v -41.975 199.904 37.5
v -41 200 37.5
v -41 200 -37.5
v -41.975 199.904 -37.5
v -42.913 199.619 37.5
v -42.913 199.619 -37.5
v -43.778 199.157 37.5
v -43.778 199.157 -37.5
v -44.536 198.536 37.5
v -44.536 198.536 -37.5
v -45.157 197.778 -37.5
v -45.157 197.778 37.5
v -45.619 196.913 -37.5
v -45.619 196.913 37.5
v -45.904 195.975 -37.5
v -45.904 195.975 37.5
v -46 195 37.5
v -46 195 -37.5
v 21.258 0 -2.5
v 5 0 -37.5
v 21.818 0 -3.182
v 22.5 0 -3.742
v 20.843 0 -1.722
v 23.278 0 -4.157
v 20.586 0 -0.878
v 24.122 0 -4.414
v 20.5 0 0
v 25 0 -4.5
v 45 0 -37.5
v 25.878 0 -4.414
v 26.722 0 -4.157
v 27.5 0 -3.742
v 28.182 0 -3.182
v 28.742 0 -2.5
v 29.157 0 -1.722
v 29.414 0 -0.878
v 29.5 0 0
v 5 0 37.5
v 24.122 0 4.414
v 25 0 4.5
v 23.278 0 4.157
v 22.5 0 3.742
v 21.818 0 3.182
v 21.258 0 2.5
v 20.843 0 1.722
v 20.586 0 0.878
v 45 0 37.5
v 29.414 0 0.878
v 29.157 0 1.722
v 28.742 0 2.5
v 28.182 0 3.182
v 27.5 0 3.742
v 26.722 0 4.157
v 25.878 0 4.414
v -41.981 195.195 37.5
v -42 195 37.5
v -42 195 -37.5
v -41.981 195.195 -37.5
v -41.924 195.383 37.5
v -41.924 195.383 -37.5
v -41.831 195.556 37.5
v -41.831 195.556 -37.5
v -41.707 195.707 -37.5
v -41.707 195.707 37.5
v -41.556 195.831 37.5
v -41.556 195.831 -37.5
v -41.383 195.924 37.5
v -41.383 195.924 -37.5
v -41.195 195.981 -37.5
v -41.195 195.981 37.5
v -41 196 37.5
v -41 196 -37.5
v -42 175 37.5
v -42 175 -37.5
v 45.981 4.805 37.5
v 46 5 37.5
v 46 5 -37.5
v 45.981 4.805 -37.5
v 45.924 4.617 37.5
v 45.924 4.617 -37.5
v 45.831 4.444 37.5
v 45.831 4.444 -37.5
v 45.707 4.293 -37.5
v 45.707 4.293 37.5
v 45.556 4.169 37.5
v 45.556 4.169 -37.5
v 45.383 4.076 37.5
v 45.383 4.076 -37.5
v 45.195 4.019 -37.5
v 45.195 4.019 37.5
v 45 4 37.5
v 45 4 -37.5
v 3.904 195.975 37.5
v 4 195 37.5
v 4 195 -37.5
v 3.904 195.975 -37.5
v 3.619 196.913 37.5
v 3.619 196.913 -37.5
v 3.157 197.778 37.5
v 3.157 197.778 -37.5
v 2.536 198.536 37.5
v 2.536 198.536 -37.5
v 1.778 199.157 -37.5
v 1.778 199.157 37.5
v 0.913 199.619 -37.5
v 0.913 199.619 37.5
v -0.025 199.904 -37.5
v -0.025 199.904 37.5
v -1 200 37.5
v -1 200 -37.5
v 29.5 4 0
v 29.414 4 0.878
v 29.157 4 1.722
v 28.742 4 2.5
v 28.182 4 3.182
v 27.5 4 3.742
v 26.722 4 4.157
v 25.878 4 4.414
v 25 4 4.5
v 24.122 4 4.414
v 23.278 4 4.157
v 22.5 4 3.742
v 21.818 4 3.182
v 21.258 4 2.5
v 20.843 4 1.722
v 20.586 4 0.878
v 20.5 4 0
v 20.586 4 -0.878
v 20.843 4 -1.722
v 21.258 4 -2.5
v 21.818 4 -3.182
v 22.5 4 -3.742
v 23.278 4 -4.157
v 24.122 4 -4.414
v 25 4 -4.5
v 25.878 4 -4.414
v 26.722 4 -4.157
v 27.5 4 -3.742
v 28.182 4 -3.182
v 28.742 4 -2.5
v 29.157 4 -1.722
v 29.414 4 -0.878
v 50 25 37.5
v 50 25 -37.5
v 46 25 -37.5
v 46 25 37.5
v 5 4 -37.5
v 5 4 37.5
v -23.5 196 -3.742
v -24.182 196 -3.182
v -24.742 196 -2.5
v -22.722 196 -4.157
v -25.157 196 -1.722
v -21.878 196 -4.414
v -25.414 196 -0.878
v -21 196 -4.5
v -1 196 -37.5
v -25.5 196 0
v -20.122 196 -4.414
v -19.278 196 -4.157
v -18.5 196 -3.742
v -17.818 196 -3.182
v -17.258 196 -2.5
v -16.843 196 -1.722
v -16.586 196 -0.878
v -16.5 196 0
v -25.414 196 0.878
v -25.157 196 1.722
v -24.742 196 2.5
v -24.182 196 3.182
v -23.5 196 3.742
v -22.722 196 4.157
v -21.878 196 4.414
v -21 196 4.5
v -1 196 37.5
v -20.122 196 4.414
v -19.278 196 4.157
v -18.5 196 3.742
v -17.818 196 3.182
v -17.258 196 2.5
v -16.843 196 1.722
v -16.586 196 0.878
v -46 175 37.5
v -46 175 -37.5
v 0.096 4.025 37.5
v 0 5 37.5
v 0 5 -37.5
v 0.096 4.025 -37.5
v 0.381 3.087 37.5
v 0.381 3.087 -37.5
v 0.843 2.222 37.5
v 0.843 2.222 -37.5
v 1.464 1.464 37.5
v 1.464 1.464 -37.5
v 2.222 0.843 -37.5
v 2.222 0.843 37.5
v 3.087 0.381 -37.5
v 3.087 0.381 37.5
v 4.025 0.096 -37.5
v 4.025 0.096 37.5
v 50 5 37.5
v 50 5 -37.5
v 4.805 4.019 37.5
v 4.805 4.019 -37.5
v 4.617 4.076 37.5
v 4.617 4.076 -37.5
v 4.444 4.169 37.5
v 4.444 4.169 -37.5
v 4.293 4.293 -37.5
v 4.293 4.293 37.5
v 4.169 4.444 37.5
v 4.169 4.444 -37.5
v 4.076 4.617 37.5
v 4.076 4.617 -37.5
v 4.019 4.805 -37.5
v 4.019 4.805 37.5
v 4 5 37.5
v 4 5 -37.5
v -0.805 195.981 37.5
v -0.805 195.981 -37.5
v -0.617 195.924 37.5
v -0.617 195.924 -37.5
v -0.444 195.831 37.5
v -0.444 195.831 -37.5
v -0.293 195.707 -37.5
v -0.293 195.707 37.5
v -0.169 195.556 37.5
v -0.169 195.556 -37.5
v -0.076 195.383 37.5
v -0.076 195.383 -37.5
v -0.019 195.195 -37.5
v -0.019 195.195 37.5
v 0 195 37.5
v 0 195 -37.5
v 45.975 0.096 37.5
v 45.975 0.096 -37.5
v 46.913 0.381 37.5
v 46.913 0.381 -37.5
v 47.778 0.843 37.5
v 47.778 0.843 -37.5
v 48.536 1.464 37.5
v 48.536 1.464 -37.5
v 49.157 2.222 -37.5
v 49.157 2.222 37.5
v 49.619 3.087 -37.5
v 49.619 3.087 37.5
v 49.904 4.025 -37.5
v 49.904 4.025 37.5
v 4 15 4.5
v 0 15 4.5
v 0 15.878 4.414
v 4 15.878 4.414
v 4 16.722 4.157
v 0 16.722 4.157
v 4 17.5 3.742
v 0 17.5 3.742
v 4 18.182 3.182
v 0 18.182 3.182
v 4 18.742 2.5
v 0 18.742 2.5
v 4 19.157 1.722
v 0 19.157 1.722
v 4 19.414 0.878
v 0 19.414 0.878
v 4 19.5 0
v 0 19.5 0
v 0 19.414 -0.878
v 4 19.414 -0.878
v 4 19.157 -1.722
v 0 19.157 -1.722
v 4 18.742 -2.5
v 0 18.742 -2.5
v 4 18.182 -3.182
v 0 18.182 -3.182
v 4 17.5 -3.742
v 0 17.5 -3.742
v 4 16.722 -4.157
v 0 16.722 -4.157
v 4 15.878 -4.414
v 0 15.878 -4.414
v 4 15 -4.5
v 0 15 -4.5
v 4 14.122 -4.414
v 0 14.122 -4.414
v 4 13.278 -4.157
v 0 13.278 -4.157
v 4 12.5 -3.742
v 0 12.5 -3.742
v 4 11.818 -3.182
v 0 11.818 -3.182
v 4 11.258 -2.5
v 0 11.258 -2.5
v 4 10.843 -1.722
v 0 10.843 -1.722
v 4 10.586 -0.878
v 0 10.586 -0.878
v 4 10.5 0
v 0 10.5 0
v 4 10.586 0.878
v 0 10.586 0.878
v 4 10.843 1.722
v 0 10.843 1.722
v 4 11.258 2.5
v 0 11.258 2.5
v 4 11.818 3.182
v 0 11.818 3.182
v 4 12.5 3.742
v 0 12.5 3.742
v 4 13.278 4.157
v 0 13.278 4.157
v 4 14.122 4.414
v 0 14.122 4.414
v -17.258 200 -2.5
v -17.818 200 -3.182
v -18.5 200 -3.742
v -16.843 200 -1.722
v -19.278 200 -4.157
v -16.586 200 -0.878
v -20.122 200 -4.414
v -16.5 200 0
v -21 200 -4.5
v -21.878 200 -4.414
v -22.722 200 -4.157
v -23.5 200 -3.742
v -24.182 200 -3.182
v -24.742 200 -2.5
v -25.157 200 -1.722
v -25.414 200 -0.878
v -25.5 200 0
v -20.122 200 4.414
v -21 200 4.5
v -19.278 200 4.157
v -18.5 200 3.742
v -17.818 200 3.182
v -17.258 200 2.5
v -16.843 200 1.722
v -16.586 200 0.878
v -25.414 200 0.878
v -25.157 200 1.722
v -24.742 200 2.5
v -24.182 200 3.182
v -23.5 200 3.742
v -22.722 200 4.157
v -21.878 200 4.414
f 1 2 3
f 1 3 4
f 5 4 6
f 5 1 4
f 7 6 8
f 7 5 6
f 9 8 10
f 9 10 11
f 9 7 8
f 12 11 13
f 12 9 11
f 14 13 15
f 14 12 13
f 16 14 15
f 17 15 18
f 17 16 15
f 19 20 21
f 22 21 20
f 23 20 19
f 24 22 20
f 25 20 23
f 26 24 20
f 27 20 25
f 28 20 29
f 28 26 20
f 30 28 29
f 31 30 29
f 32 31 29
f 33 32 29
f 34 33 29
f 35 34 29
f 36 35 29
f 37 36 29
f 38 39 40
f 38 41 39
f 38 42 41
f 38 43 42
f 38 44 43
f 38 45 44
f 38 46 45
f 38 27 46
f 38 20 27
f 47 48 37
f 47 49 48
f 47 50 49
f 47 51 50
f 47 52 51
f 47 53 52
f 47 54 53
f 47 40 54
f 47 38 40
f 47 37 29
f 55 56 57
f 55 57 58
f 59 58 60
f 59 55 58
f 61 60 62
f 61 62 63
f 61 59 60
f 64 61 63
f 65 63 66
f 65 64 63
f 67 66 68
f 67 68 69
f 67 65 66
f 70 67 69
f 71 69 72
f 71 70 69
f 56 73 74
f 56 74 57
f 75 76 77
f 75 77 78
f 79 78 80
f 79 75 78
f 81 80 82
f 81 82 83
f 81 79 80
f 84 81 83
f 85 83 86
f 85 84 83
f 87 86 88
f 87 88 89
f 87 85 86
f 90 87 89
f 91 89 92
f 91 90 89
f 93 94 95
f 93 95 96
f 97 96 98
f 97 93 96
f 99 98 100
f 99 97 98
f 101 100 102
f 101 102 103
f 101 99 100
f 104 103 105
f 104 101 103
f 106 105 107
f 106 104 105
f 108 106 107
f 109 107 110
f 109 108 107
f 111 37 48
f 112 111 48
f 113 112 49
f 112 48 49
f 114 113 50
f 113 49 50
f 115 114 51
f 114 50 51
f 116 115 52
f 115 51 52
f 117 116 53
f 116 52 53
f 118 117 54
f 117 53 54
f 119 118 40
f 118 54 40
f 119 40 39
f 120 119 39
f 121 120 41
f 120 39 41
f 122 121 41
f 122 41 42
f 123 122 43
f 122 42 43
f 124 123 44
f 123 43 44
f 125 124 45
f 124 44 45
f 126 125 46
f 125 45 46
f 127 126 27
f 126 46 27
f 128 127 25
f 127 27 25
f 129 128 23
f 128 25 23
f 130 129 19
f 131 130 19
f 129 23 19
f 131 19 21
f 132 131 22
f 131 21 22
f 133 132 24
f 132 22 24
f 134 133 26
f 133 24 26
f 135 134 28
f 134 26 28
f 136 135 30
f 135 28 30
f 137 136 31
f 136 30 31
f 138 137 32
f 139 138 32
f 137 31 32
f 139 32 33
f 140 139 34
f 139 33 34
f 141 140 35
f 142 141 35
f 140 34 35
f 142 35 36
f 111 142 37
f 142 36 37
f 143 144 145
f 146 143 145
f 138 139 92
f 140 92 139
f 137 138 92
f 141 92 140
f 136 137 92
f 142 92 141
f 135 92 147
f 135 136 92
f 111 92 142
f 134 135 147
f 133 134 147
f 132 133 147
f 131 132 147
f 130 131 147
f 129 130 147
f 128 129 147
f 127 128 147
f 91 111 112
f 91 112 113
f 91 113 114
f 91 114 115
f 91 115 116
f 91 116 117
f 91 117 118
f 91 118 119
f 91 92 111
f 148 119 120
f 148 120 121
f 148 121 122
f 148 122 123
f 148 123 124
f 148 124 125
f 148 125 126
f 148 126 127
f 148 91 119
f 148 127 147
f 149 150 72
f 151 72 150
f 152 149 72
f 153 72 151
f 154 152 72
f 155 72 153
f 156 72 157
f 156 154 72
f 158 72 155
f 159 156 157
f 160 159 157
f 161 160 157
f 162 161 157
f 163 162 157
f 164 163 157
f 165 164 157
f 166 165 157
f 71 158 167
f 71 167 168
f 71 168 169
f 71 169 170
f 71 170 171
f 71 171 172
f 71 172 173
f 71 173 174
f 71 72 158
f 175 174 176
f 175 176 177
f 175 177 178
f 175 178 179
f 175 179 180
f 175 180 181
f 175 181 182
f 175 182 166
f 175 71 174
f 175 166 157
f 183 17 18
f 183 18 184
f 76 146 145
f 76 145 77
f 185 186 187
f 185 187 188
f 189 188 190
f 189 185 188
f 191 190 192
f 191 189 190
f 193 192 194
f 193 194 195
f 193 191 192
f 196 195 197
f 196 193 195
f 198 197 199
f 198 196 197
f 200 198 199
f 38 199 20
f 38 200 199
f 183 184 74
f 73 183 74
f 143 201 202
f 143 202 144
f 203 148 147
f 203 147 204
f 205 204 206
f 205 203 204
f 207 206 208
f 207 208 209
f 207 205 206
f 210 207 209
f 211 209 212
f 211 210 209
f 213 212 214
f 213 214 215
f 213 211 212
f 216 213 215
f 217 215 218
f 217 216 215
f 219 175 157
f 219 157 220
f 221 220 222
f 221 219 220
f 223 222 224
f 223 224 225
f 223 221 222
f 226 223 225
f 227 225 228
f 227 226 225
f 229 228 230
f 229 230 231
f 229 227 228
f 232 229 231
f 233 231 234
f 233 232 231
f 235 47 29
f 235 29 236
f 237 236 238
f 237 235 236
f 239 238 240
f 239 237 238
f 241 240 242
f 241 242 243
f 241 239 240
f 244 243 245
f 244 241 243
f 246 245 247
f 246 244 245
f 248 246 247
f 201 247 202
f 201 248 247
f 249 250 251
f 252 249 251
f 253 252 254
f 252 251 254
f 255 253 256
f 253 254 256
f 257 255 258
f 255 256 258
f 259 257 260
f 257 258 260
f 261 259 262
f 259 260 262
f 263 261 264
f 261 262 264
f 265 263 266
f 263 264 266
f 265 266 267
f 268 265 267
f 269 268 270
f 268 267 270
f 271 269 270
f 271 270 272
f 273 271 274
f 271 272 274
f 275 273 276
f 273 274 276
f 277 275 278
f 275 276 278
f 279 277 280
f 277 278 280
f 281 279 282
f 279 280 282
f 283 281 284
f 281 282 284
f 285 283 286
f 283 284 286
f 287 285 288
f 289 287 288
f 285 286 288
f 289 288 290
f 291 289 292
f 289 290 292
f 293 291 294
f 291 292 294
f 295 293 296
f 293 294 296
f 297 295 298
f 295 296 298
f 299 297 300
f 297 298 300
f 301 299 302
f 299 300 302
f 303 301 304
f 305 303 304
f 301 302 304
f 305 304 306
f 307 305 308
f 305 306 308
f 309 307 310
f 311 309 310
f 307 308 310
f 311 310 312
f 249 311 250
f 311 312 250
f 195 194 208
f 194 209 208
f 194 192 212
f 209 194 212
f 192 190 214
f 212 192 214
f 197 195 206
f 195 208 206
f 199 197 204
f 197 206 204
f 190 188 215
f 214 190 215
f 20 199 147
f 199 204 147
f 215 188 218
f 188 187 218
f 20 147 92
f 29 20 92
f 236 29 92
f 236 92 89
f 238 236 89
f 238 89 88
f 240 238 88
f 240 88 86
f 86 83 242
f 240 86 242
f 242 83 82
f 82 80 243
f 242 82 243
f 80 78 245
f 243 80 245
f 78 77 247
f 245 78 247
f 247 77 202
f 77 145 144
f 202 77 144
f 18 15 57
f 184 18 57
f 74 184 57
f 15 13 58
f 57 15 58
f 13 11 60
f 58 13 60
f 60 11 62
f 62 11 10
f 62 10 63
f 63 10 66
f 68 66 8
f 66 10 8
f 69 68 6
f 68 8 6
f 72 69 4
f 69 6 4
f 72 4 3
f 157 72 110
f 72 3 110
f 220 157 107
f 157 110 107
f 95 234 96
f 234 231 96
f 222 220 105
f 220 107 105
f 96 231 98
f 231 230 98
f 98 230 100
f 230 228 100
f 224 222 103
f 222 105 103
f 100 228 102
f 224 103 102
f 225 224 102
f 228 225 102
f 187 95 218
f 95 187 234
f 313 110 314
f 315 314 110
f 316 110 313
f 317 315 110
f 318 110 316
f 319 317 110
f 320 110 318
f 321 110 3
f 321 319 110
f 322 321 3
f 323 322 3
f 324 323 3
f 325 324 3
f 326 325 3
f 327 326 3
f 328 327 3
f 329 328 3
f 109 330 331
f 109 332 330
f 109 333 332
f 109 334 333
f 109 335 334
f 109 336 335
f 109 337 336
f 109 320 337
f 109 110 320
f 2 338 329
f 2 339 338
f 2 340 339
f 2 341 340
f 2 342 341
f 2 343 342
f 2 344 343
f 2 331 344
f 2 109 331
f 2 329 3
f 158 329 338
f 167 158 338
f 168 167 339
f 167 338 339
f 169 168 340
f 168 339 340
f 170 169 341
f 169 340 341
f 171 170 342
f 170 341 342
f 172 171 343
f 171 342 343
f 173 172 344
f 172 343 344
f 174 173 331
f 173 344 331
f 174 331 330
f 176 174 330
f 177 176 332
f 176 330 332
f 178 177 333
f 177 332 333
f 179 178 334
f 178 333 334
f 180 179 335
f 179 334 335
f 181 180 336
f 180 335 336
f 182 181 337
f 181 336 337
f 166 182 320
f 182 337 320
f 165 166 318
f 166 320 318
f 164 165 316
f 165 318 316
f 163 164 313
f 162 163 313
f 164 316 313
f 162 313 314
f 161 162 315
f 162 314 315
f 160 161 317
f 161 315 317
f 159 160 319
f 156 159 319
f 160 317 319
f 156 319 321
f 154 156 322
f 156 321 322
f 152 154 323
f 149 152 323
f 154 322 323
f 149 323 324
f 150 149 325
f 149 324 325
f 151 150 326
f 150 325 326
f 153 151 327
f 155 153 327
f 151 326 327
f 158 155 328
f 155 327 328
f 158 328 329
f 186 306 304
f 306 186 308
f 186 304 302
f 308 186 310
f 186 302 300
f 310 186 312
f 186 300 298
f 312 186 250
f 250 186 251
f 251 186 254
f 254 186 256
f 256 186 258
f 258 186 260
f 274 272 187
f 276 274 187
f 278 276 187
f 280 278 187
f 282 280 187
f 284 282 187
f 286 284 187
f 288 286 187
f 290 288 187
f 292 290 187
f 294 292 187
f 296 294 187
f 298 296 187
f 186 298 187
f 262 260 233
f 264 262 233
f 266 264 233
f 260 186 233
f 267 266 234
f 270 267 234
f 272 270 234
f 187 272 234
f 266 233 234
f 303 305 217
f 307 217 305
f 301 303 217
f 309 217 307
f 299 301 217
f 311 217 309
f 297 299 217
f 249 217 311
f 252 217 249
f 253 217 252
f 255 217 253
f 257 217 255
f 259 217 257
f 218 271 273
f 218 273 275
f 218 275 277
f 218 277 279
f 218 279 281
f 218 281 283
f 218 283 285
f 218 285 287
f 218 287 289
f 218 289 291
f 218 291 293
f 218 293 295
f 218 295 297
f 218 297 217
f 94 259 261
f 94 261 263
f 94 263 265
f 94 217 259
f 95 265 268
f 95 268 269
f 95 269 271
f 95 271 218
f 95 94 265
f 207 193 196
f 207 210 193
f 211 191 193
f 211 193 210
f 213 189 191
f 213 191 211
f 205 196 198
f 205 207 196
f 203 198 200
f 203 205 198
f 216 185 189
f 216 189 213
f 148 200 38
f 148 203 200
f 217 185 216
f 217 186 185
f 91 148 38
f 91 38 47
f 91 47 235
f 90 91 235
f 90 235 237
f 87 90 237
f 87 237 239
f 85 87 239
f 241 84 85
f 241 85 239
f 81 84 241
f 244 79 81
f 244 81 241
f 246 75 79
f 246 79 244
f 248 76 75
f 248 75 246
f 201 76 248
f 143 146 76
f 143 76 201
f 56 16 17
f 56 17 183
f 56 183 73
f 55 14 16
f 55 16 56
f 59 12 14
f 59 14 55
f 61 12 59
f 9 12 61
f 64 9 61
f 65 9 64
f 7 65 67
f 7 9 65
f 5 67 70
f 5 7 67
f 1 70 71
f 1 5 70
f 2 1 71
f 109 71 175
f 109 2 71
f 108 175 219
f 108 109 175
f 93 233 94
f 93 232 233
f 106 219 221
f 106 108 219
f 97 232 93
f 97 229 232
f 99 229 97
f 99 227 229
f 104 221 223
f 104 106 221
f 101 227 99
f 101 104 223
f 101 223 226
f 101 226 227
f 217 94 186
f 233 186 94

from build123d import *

# Parameters (mm, degrees)
BASEFLANGE_W                   = 75
BASEFLANGE_H                   = 200
BASE_FLANGE1_DEPTH             = 4
EDGE_FLANGE1_STRIP_W           = 18
EDGE_FLANGE1_STRIP_H           = 4
EDGE_FLANGE1_STRIP_CUT_DEPTH   = 75
EDGE_FLANGE1_STRIP_2_W         = 18
EDGE_FLANGE1_STRIP_2_H         = 4
EDGE_FLANGE1_STRIP_CUT_2_DEPTH = 75
EDGE_FLANGE1_DEPTH             = 75
EDGE_FLANGE1_BEND_DEPTH        = 75
EDGE_FLANGE2_STRIP_W           = 18
EDGE_FLANGE2_STRIP_H           = 4
EDGE_FLANGE2_STRIP_CUT_DEPTH   = 75
EDGE_FLANGE2_STRIP_2_W         = 18
EDGE_FLANGE2_STRIP_2_H         = 4
EDGE_FLANGE2_STRIP_CUT_2_DEPTH = 75
EDGE_FLANGE2_DEPTH             = 75
EDGE_FLANGE2_BEND_DEPTH        = 75
SKETCH15_R                     = 4.5
EXTRUDE1_DEPTH                 = 4
SKETCH16_R                     = 4.5
EXTRUDE2_DEPTH                 = 4
SKETCH17_R                     = 4.5
CUT_EXTRUDE1_DEPTH             = 4


# Sheet-metal steps are written as plain solids
with BuildPart() as part:
    # BaseFlange → Base-Flange1 (new body)
    with BuildSketch(Plane(origin=(0, 0, 0), x_dir=(0, 0, -1), z_dir=(1, 0, 0))):
        with Locations((0, 100)):
            Rectangle(BASEFLANGE_W, BASEFLANGE_H)
    extrude(amount=BASE_FLANGE1_DEPTH)

    # Edge-Flange1 strip (across the edge) → Edge-Flange1 strip cut (cut)
    with BuildSketch(Plane(origin=(0, 200, 37.5), x_dir=(0, -1, 0), z_dir=(0, 0, -1))):
        with Locations((-4, -2)):
            Rectangle(EDGE_FLANGE1_STRIP_W, EDGE_FLANGE1_STRIP_H)
    extrude(amount=EDGE_FLANGE1_STRIP_CUT_DEPTH, mode=Mode.SUBTRACT)

    # Edge-Flange1 strip 2 (across the edge) → Edge-Flange1 strip cut 2 (cut)
    with BuildSketch(Plane(origin=(4, 0, 37.5), x_dir=(0, 1, 0), z_dir=(0, 0, -1))):
        with Locations((-4, -2)):
            Rectangle(EDGE_FLANGE1_STRIP_2_W, EDGE_FLANGE1_STRIP_2_H)
    extrude(amount=EDGE_FLANGE1_STRIP_CUT_2_DEPTH, mode=Mode.SUBTRACT)

    # Edge-Flange1 section (across the edge) → Edge-Flange1 (add)
    with BuildSketch(Plane(origin=(0, 200, 37.5), x_dir=(0, -1, 0), z_dir=(0, 0, -1))):
        with BuildLine():
            Line((0, 1), (0, 46))
            Line((0, 46), (4, 46))
            Line((4, 46), (4, 1))
            ThreePointArc((4, 1), (4.292893219, 0.292893219), (5, 0))
            Line((5, 0), (5, -4))
            ThreePointArc((5, -4), (1.464466094, -2.535533906), (0, 1))
        make_face()
    extrude(amount=EDGE_FLANGE1_DEPTH)

    # Edge-Flange1 section 2 (across the edge) → Edge-Flange1 bend (add)
    with BuildSketch(Plane(origin=(4, 0, 37.5), x_dir=(0, 1, 0), z_dir=(0, 0, -1))):
        with BuildLine():
            Line((0, 1), (0, 46))
            Line((0, 46), (4, 46))
            Line((4, 46), (4, 1))
            ThreePointArc((4, 1), (4.292893219, 0.292893219), (5, 0))
            Line((5, 0), (5, -4))
            ThreePointArc((5, -4), (1.464466094, -2.535533906), (0, 1))
        make_face()
    extrude(amount=EDGE_FLANGE1_BEND_DEPTH)

    # Edge-Flange2 strip (across the edge) → Edge-Flange2 strip cut (cut)
    with BuildSketch(Plane(origin=(-46, 196, 37.5), x_dir=(1, 0, 0), z_dir=(0, 0, -1))):
        with Locations((-4, -2)):
            Rectangle(EDGE_FLANGE2_STRIP_W, EDGE_FLANGE2_STRIP_H)
    extrude(amount=EDGE_FLANGE2_STRIP_CUT_DEPTH, mode=Mode.SUBTRACT)

    # Edge-Flange2 strip 2 (across the edge) → Edge-Flange2 strip cut 2 (cut)
    with BuildSketch(Plane(origin=(50, 4, 37.5), x_dir=(-1, 0, 0), z_dir=(0, 0, -1))):
        with Locations((-4, -2)):
            Rectangle(EDGE_FLANGE2_STRIP_2_W, EDGE_FLANGE2_STRIP_2_H)
    extrude(amount=EDGE_FLANGE2_STRIP_CUT_2_DEPTH, mode=Mode.SUBTRACT)

    # Edge-Flange2 section (across the edge) → Edge-Flange2 (add)
    with BuildSketch(Plane(origin=(-46, 196, 37.5), x_dir=(1, 0, 0), z_dir=(0, 0, -1))):
        with BuildLine():
            Line((0, 1), (0, 21))
            Line((0, 21), (4, 21))
            Line((4, 21), (4, 1))
            ThreePointArc((4, 1), (4.292893219, 0.292893219), (5, 0))
            Line((5, 0), (5, -4))
            ThreePointArc((5, -4), (1.464466094, -2.535533906), (0, 1))
        make_face()
    extrude(amount=EDGE_FLANGE2_DEPTH)

    # Edge-Flange2 section 2 (across the edge) → Edge-Flange2 bend (add)
    with BuildSketch(Plane(origin=(50, 4, 37.5), x_dir=(-1, 0, 0), z_dir=(0, 0, -1))):
        with BuildLine():
            Line((0, 1), (0, 21))
            Line((0, 21), (4, 21))
            Line((4, 21), (4, 1))
            ThreePointArc((4, 1), (4.292893219, 0.292893219), (5, 0))
            Line((5, 0), (5, -4))
            ThreePointArc((5, -4), (1.464466094, -2.535533906), (0, 1))
        make_face()
    extrude(amount=EDGE_FLANGE2_BEND_DEPTH)

    # Sketch15 → Extrude1 (cut)
    with BuildSketch(Plane(origin=(0, 200, 0), x_dir=(1, 0, 0), z_dir=(0, 1, 0))):
        with Locations(Location((-21, 0, 0), (0, 0, 180))):
            Circle(SKETCH15_R)
    extrude(amount=-EXTRUDE1_DEPTH, mode=Mode.SUBTRACT)

    # Sketch16 → Extrude2 (cut)
    with BuildSketch(Plane.XZ):
        with Locations((25, 0)):
            Circle(SKETCH16_R)
    extrude(amount=-EXTRUDE2_DEPTH, mode=Mode.SUBTRACT)

    # Sketch17 → Cut-Extrude1 (cut)
    with BuildSketch(Plane.ZY):
        with Locations((0, 15)):
            Circle(SKETCH17_R)
    extrude(amount=-CUT_EXTRUDE1_DEPTH, mode=Mode.SUBTRACT)


solid = part.part
